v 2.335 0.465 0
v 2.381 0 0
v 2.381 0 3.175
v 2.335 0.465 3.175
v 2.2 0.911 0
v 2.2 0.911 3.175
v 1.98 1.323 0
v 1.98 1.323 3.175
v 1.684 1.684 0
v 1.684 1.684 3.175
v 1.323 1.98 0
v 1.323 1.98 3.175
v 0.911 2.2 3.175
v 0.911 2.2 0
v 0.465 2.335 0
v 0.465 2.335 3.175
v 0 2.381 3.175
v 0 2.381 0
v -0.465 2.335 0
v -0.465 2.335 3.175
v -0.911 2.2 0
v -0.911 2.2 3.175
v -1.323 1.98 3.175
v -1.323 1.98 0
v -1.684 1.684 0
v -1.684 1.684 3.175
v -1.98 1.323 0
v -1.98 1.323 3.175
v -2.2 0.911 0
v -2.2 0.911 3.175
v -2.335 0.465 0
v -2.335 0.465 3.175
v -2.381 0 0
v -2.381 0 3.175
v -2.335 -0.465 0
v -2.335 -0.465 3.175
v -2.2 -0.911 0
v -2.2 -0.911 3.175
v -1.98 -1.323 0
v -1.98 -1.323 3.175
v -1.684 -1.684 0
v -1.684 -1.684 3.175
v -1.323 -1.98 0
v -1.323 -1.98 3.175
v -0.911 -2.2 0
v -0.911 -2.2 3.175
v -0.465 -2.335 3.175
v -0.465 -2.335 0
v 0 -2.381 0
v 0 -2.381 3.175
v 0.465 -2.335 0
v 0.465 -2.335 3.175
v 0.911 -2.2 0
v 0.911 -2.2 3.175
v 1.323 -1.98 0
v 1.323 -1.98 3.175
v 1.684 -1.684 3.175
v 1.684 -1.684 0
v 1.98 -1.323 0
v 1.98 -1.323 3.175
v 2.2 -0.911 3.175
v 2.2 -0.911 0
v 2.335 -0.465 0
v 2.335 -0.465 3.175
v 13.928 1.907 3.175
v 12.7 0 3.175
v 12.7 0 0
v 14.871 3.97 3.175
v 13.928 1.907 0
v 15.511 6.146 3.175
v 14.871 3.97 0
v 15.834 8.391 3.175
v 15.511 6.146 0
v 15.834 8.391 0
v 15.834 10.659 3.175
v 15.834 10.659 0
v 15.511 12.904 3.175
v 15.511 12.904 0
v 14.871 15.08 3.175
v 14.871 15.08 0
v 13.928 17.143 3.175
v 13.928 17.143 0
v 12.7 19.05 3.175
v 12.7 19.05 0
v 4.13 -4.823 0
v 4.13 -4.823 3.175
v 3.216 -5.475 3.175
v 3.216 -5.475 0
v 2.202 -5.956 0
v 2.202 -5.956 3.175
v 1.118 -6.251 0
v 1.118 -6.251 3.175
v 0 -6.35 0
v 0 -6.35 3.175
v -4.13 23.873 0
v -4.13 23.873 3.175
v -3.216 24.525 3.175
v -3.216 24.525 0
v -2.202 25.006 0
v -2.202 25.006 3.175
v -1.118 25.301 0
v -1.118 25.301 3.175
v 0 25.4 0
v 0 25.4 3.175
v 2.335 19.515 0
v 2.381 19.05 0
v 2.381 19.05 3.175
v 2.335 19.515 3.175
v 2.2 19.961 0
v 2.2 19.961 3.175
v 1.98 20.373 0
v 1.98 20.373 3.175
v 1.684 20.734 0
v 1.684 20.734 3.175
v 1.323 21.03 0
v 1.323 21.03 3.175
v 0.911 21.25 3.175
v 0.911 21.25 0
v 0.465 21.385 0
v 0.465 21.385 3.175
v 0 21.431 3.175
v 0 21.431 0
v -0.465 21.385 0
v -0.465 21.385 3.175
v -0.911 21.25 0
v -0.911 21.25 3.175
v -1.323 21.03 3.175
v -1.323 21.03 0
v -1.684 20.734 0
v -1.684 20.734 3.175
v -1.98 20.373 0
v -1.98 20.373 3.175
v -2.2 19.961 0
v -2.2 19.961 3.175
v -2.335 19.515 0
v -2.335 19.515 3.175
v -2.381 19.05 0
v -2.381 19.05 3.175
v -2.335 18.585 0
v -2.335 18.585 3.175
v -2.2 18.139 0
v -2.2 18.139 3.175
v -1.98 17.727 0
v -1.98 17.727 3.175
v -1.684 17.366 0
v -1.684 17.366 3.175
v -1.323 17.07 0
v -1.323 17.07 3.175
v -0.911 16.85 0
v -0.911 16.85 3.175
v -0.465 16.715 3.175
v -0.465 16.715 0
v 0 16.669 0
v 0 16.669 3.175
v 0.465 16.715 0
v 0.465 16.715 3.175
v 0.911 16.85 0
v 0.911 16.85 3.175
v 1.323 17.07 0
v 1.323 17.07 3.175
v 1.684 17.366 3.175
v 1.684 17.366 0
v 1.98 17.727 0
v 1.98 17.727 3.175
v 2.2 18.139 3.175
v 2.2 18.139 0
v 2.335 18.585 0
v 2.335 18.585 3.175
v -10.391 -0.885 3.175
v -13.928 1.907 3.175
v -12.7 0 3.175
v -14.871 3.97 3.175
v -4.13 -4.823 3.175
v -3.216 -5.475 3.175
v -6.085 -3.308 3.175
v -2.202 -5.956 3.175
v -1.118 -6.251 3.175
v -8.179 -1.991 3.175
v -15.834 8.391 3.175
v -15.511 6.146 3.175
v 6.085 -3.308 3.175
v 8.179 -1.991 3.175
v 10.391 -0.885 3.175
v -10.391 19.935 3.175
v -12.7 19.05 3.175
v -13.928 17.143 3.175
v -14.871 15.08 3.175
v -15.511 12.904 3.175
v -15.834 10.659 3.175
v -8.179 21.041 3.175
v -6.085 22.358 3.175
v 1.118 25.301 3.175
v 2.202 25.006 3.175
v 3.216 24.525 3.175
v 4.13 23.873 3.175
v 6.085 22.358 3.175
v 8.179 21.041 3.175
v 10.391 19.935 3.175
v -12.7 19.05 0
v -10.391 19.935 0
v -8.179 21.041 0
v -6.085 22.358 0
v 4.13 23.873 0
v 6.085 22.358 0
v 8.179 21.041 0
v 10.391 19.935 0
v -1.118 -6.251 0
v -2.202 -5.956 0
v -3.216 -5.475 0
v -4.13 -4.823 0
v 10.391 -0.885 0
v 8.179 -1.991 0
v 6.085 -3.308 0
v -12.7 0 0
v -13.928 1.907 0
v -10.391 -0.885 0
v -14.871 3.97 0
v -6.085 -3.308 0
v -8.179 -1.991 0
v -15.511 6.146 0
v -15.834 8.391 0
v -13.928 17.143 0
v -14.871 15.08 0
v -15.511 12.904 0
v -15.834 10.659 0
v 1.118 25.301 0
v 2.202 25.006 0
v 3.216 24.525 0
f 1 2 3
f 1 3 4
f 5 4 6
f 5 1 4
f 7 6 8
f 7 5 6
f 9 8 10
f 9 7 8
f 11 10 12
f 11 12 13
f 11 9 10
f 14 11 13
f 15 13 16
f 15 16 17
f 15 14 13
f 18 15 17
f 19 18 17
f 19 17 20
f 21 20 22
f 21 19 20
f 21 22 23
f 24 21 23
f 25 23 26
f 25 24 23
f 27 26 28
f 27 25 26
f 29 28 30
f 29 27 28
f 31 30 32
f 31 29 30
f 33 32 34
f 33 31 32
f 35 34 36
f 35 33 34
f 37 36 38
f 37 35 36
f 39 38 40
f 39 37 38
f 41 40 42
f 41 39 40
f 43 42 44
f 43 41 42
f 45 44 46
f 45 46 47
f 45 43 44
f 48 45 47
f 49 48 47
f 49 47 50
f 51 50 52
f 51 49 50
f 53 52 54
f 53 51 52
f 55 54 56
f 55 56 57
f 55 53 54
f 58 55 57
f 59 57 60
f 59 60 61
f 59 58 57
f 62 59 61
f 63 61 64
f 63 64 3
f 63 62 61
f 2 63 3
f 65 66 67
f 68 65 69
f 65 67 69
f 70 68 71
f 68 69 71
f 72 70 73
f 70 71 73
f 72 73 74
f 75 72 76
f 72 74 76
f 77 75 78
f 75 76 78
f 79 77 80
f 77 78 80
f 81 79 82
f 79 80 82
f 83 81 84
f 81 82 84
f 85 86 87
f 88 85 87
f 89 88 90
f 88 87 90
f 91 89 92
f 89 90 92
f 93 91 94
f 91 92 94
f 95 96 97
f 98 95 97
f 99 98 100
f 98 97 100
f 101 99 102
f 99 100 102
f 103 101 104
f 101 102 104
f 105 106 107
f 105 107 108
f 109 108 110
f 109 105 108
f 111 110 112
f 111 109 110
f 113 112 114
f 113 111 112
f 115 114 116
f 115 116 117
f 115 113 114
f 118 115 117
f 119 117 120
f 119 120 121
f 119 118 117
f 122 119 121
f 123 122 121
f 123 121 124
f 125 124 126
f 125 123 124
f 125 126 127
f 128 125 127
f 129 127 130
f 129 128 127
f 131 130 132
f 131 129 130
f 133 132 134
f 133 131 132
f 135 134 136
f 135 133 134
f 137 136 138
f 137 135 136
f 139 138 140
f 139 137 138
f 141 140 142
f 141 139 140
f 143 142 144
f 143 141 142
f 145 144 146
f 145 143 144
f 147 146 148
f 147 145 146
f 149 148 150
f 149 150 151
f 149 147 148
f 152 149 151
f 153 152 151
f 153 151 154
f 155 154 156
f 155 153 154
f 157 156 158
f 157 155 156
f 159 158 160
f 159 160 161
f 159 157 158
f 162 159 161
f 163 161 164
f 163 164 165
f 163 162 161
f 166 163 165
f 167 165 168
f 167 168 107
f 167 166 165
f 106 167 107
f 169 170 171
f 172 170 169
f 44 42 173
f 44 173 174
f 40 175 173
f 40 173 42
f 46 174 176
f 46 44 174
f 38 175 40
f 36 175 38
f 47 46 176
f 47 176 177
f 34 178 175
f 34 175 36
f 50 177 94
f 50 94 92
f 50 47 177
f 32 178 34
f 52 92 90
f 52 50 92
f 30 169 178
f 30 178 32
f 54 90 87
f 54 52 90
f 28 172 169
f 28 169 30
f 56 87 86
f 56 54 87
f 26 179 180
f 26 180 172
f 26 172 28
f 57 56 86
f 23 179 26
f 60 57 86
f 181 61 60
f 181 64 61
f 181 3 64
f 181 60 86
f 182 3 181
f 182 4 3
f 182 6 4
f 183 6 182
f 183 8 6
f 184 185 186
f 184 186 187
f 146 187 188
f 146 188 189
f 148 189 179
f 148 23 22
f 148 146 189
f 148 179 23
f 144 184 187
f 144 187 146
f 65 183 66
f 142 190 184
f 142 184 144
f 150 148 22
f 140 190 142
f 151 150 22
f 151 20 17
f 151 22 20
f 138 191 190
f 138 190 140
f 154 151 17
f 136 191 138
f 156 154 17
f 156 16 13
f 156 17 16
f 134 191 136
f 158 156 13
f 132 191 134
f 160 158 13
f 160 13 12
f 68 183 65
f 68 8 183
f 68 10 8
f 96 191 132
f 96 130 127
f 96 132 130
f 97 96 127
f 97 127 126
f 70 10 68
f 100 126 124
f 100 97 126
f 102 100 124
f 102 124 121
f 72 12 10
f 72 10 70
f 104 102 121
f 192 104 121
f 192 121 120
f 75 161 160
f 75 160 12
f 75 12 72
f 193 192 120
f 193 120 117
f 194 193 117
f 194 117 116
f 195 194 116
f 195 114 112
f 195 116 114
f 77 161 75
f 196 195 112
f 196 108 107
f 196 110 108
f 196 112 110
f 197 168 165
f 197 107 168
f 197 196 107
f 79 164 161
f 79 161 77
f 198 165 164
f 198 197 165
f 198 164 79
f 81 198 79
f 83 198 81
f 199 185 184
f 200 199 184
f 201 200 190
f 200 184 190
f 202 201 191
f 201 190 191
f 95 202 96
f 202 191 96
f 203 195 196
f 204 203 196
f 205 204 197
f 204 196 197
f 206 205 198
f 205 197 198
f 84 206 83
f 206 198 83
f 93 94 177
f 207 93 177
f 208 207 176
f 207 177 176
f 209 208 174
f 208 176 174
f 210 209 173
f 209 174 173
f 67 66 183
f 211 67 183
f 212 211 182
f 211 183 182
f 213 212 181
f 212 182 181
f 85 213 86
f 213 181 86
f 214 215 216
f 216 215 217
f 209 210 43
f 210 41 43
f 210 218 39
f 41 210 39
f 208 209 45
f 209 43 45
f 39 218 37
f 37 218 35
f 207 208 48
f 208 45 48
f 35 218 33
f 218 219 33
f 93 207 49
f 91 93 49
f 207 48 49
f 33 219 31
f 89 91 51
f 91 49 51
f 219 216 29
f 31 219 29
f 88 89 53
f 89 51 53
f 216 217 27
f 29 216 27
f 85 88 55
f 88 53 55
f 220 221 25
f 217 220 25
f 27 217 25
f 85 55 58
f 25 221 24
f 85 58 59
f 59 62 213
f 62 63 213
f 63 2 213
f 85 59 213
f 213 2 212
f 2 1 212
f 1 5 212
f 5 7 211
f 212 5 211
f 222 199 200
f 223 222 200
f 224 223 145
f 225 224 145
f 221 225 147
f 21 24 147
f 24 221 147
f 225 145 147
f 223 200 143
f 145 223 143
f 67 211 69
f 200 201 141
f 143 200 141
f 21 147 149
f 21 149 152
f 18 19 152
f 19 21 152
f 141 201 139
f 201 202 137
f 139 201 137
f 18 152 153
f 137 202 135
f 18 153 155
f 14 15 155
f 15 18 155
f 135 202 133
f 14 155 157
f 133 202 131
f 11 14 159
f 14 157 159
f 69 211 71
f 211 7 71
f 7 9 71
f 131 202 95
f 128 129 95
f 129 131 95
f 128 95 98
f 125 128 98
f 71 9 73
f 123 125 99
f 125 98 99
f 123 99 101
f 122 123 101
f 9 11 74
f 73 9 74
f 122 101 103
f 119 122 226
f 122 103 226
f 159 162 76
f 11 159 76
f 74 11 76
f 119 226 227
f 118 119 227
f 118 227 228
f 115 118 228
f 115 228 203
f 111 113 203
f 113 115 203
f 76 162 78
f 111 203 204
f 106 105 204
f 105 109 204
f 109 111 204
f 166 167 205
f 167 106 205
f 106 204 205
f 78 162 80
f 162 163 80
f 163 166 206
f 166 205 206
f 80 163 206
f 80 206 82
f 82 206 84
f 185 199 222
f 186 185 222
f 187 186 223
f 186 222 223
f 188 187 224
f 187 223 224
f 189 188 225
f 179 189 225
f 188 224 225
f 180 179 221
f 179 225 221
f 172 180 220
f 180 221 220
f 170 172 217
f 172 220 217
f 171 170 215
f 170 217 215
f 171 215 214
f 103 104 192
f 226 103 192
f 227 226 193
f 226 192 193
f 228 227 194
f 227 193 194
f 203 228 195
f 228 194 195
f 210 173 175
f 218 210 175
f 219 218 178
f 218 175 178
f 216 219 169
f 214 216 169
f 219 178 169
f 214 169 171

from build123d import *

# Parameters (mm, degrees)
SKETCH1_R           = 15.875
SKETCH1_R_2         = 2.38125
BOSS_EXTRUDE2_DEPTH = 3.175
SKETCH2_R           = 26.68586127
SKETCH2_R_2         = 15.875
CUT_EXTRUDE1_DEPTH  = 31.120694713


with BuildPart() as part:
    # Sketch1 → Boss-Extrude2 (new body)
    with BuildSketch(Plane.XY):
        with Locations((0, 9.525)):
            Circle(SKETCH1_R)
        Circle(SKETCH1_R_2, mode=Mode.SUBTRACT)
        with Locations((0, 19.05)):
            Circle(SKETCH1_R_2, mode=Mode.SUBTRACT)
    extrude(amount=BOSS_EXTRUDE2_DEPTH)

    # Sketch2 → Cut-Extrude1 (cut, through all)
    # profile 1 of 5: a face of its own
    with BuildSketch(Plane.XY.offset(3.175)):
        with Locations((0, 9.525)):
            Circle(SKETCH2_R)
        with Locations((0, 9.525)):
            Circle(SKETCH2_R_2, mode=Mode.SUBTRACT)
    # profile 2 of 5: a face of its own
    with BuildSketch(Plane.XY.offset(3.175)):
        with BuildLine():
            ThreePointArc((-4.130251428, 23.873227461), (-2.201704524, 25.006089085), (0, 25.4))
            ThreePointArc((0, 25.4), (-7.099515829, 23.724031657), (-12.7, 19.05))
            ThreePointArc((-12.7, 19.05), (-8.178609866, 21.041380315), (-4.130251428, 23.873227461))
        make_face()
    # profile 3 of 5: a face of its own
    with BuildSketch(Plane.XY.offset(3.175)):
        with BuildLine():
            ThreePointArc((4.130251428, 23.873227461), (8.178609866, 21.041380315), (12.7, 19.05))
            ThreePointArc((12.7, 19.05), (7.099515829, 23.724031657), (0, 25.4))
            ThreePointArc((0, 25.4), (2.201704524, 25.006089085), (4.130251428, 23.873227461))
        make_face()
    # profile 4 of 5: a face of its own
    with BuildSketch(Plane.XY.offset(3.175)):
        with BuildLine():
            ThreePointArc((-3e-09, -6.35), (7.099515827, -4.674031658), (12.7, 0))
            ThreePointArc((12.7, 0), (8.178609866, -1.991380315), (4.130251428, -4.823227461))
            ThreePointArc((4.130251428, -4.823227461), (2.201704523, -5.956089085), (-3e-09, -6.35))
        make_face()
    # profile 5 of 5: a face of its own
    with BuildSketch(Plane.XY.offset(3.175)):
        with BuildLine():
            ThreePointArc((-12.7, 0), (-7.09951583, -4.674031657), (-3e-09, -6.35))
            ThreePointArc((-3e-09, -6.35), (-2.201704525, -5.956089084), (-4.130251428, -4.823227461))
            ThreePointArc((-4.130251428, -4.823227461), (-8.178609866, -1.991380315), (-12.7, 0))
        make_face()
    extrude(amount=-CUT_EXTRUDE1_DEPTH, mode=Mode.SUBTRACT)


solid = part.part
